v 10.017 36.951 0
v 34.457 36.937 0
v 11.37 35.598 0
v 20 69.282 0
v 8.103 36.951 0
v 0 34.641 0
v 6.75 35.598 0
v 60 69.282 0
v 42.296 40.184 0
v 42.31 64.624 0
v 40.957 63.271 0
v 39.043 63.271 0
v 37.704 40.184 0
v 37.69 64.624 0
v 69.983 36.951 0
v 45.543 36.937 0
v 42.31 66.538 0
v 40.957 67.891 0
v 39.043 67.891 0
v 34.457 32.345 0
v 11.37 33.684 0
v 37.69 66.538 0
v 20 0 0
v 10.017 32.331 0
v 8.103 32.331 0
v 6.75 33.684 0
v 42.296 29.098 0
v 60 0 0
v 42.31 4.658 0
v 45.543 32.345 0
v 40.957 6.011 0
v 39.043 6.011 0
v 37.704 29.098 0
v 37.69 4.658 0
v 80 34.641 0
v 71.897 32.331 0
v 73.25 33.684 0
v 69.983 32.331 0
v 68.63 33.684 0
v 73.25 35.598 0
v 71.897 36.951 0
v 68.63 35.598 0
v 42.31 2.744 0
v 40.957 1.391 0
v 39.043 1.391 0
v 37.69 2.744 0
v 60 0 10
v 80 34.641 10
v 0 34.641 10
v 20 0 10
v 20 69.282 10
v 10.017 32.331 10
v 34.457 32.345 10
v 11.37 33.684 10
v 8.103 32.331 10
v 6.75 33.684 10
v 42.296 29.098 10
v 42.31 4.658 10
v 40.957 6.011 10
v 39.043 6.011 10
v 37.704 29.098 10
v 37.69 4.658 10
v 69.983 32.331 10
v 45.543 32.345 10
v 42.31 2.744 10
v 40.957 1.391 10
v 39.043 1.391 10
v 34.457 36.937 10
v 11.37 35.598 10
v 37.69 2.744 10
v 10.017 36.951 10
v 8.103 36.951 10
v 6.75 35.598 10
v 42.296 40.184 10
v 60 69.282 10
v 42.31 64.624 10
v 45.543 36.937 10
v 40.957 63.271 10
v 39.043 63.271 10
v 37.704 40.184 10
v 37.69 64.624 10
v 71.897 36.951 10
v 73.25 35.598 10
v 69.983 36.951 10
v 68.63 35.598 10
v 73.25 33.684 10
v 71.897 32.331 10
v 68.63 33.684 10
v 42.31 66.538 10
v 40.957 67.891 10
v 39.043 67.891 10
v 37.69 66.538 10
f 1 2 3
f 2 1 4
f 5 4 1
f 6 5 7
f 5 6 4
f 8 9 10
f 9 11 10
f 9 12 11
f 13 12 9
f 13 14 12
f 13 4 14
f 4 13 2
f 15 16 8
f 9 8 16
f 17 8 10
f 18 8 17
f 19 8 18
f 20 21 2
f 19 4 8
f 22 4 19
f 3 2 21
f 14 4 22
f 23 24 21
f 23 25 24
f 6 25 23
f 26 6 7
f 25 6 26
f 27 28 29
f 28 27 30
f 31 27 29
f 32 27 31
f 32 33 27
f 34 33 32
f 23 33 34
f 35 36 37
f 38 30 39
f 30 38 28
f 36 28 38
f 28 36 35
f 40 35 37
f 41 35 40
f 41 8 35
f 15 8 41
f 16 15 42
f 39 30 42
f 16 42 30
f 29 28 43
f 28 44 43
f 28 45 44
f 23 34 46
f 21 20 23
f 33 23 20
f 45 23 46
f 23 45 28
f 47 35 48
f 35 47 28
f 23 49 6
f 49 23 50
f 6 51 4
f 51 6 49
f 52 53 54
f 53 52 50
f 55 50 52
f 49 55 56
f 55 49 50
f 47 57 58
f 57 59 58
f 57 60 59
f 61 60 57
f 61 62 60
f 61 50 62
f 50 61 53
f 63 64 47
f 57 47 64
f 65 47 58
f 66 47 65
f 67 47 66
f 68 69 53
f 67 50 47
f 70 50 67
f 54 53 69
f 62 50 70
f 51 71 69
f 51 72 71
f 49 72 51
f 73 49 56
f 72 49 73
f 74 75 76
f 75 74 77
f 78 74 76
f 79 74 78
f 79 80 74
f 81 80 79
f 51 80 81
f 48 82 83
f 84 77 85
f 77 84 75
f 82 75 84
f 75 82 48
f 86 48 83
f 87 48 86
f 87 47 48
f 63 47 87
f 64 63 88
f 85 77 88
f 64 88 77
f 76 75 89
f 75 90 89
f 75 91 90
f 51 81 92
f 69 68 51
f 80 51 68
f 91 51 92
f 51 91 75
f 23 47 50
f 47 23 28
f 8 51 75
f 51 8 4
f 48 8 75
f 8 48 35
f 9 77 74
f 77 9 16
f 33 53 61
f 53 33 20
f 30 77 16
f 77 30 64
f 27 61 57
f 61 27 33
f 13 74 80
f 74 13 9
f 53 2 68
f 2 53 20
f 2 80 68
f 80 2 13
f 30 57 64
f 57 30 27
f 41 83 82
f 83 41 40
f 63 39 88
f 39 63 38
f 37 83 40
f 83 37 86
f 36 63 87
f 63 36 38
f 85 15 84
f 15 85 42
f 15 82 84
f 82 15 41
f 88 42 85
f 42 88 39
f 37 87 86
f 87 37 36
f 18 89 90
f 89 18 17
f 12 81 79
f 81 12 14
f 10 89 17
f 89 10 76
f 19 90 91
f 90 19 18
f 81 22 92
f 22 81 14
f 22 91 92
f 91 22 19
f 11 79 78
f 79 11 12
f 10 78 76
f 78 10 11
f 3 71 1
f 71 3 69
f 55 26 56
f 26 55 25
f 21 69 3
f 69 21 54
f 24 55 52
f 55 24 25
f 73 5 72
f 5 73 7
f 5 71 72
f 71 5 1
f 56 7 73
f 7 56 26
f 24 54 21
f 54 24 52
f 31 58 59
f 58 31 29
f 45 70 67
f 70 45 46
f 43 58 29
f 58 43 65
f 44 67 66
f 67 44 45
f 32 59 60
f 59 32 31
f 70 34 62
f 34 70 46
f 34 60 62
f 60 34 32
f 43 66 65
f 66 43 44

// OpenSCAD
$fn = 32;

// ----------------------------------------------------------------------
// Polygon plate: 6-gon R40, 4 bolt windows
// ----------------------------------------------------------------------

// --- parameters (mm) ---
sides = 6;                // number of polygon sides
plate_r = 40;             // circumscribed radius of the polygon
bore_r = 6;               // centre bore radius
bolts = 4;                // number of bolt windows
ring_r = 30.94;           // bolt-circle radius
bolt_r = 2.5;             // bolt window radius
plate_t = 10;             // plate thickness, Z (extrusion height)

plate_d = 2 * plate_r;  // circumscribed diameter
bore_d = 2 * bore_r;  // centre bore diameter
bolt_d = 2 * bolt_r;  // bolt window diameter
ring_d = 2 * ring_r;  // bolt-circle diameter

profile = [[80, 34.641], [60, 69.282], [20, 69.282], [0, 34.641], [20, 0], [60, 0]];  // primary outline, 6 points, counter clockwise
void_1 = [[45.543, 36.937], [42.296, 40.184], [37.704, 40.184], [34.457, 36.937], [34.457, 32.345], [37.704, 29.098], [42.296, 29.098], [45.543, 32.345]];  // centre bore, 8 points
void_2 = [[73.25, 35.598], [71.897, 36.951], [69.983, 36.951], [68.63, 35.598], [68.63, 33.684], [69.983, 32.331], [71.897, 32.331], [73.25, 33.684]];  // bolt window 1, 8 points
void_3 = [[42.31, 66.538], [40.957, 67.891], [39.043, 67.891], [37.69, 66.538], [37.69, 64.624], [39.043, 63.271], [40.957, 63.271], [42.31, 64.624]];  // bolt window 2, 8 points
void_4 = [[11.37, 35.598], [10.017, 36.951], [8.103, 36.951], [6.75, 35.598], [6.75, 33.684], [8.103, 32.331], [10.017, 32.331], [11.37, 33.684]];  // bolt window 3, 8 points
void_5 = [[42.31, 4.658], [40.957, 6.011], [39.043, 6.011], [37.69, 4.658], [37.69, 2.744], [39.043, 1.391], [40.957, 1.391], [42.31, 2.744]];  // bolt window 4, 8 points

// --- the one profile operation ---
difference() {
  linear_extrude(height = plate_t) polygon(points = profile);
  translate([0, 0, -1])
    linear_extrude(height = plate_t + 2) polygon(points = void_1);
  translate([0, 0, -1])
    linear_extrude(height = plate_t + 2) polygon(points = void_2);
  translate([0, 0, -1])
    linear_extrude(height = plate_t + 2) polygon(points = void_3);
  translate([0, 0, -1])
    linear_extrude(height = plate_t + 2) polygon(points = void_4);
  translate([0, 0, -1])
    linear_extrude(height = plate_t + 2) polygon(points = void_5);
}
